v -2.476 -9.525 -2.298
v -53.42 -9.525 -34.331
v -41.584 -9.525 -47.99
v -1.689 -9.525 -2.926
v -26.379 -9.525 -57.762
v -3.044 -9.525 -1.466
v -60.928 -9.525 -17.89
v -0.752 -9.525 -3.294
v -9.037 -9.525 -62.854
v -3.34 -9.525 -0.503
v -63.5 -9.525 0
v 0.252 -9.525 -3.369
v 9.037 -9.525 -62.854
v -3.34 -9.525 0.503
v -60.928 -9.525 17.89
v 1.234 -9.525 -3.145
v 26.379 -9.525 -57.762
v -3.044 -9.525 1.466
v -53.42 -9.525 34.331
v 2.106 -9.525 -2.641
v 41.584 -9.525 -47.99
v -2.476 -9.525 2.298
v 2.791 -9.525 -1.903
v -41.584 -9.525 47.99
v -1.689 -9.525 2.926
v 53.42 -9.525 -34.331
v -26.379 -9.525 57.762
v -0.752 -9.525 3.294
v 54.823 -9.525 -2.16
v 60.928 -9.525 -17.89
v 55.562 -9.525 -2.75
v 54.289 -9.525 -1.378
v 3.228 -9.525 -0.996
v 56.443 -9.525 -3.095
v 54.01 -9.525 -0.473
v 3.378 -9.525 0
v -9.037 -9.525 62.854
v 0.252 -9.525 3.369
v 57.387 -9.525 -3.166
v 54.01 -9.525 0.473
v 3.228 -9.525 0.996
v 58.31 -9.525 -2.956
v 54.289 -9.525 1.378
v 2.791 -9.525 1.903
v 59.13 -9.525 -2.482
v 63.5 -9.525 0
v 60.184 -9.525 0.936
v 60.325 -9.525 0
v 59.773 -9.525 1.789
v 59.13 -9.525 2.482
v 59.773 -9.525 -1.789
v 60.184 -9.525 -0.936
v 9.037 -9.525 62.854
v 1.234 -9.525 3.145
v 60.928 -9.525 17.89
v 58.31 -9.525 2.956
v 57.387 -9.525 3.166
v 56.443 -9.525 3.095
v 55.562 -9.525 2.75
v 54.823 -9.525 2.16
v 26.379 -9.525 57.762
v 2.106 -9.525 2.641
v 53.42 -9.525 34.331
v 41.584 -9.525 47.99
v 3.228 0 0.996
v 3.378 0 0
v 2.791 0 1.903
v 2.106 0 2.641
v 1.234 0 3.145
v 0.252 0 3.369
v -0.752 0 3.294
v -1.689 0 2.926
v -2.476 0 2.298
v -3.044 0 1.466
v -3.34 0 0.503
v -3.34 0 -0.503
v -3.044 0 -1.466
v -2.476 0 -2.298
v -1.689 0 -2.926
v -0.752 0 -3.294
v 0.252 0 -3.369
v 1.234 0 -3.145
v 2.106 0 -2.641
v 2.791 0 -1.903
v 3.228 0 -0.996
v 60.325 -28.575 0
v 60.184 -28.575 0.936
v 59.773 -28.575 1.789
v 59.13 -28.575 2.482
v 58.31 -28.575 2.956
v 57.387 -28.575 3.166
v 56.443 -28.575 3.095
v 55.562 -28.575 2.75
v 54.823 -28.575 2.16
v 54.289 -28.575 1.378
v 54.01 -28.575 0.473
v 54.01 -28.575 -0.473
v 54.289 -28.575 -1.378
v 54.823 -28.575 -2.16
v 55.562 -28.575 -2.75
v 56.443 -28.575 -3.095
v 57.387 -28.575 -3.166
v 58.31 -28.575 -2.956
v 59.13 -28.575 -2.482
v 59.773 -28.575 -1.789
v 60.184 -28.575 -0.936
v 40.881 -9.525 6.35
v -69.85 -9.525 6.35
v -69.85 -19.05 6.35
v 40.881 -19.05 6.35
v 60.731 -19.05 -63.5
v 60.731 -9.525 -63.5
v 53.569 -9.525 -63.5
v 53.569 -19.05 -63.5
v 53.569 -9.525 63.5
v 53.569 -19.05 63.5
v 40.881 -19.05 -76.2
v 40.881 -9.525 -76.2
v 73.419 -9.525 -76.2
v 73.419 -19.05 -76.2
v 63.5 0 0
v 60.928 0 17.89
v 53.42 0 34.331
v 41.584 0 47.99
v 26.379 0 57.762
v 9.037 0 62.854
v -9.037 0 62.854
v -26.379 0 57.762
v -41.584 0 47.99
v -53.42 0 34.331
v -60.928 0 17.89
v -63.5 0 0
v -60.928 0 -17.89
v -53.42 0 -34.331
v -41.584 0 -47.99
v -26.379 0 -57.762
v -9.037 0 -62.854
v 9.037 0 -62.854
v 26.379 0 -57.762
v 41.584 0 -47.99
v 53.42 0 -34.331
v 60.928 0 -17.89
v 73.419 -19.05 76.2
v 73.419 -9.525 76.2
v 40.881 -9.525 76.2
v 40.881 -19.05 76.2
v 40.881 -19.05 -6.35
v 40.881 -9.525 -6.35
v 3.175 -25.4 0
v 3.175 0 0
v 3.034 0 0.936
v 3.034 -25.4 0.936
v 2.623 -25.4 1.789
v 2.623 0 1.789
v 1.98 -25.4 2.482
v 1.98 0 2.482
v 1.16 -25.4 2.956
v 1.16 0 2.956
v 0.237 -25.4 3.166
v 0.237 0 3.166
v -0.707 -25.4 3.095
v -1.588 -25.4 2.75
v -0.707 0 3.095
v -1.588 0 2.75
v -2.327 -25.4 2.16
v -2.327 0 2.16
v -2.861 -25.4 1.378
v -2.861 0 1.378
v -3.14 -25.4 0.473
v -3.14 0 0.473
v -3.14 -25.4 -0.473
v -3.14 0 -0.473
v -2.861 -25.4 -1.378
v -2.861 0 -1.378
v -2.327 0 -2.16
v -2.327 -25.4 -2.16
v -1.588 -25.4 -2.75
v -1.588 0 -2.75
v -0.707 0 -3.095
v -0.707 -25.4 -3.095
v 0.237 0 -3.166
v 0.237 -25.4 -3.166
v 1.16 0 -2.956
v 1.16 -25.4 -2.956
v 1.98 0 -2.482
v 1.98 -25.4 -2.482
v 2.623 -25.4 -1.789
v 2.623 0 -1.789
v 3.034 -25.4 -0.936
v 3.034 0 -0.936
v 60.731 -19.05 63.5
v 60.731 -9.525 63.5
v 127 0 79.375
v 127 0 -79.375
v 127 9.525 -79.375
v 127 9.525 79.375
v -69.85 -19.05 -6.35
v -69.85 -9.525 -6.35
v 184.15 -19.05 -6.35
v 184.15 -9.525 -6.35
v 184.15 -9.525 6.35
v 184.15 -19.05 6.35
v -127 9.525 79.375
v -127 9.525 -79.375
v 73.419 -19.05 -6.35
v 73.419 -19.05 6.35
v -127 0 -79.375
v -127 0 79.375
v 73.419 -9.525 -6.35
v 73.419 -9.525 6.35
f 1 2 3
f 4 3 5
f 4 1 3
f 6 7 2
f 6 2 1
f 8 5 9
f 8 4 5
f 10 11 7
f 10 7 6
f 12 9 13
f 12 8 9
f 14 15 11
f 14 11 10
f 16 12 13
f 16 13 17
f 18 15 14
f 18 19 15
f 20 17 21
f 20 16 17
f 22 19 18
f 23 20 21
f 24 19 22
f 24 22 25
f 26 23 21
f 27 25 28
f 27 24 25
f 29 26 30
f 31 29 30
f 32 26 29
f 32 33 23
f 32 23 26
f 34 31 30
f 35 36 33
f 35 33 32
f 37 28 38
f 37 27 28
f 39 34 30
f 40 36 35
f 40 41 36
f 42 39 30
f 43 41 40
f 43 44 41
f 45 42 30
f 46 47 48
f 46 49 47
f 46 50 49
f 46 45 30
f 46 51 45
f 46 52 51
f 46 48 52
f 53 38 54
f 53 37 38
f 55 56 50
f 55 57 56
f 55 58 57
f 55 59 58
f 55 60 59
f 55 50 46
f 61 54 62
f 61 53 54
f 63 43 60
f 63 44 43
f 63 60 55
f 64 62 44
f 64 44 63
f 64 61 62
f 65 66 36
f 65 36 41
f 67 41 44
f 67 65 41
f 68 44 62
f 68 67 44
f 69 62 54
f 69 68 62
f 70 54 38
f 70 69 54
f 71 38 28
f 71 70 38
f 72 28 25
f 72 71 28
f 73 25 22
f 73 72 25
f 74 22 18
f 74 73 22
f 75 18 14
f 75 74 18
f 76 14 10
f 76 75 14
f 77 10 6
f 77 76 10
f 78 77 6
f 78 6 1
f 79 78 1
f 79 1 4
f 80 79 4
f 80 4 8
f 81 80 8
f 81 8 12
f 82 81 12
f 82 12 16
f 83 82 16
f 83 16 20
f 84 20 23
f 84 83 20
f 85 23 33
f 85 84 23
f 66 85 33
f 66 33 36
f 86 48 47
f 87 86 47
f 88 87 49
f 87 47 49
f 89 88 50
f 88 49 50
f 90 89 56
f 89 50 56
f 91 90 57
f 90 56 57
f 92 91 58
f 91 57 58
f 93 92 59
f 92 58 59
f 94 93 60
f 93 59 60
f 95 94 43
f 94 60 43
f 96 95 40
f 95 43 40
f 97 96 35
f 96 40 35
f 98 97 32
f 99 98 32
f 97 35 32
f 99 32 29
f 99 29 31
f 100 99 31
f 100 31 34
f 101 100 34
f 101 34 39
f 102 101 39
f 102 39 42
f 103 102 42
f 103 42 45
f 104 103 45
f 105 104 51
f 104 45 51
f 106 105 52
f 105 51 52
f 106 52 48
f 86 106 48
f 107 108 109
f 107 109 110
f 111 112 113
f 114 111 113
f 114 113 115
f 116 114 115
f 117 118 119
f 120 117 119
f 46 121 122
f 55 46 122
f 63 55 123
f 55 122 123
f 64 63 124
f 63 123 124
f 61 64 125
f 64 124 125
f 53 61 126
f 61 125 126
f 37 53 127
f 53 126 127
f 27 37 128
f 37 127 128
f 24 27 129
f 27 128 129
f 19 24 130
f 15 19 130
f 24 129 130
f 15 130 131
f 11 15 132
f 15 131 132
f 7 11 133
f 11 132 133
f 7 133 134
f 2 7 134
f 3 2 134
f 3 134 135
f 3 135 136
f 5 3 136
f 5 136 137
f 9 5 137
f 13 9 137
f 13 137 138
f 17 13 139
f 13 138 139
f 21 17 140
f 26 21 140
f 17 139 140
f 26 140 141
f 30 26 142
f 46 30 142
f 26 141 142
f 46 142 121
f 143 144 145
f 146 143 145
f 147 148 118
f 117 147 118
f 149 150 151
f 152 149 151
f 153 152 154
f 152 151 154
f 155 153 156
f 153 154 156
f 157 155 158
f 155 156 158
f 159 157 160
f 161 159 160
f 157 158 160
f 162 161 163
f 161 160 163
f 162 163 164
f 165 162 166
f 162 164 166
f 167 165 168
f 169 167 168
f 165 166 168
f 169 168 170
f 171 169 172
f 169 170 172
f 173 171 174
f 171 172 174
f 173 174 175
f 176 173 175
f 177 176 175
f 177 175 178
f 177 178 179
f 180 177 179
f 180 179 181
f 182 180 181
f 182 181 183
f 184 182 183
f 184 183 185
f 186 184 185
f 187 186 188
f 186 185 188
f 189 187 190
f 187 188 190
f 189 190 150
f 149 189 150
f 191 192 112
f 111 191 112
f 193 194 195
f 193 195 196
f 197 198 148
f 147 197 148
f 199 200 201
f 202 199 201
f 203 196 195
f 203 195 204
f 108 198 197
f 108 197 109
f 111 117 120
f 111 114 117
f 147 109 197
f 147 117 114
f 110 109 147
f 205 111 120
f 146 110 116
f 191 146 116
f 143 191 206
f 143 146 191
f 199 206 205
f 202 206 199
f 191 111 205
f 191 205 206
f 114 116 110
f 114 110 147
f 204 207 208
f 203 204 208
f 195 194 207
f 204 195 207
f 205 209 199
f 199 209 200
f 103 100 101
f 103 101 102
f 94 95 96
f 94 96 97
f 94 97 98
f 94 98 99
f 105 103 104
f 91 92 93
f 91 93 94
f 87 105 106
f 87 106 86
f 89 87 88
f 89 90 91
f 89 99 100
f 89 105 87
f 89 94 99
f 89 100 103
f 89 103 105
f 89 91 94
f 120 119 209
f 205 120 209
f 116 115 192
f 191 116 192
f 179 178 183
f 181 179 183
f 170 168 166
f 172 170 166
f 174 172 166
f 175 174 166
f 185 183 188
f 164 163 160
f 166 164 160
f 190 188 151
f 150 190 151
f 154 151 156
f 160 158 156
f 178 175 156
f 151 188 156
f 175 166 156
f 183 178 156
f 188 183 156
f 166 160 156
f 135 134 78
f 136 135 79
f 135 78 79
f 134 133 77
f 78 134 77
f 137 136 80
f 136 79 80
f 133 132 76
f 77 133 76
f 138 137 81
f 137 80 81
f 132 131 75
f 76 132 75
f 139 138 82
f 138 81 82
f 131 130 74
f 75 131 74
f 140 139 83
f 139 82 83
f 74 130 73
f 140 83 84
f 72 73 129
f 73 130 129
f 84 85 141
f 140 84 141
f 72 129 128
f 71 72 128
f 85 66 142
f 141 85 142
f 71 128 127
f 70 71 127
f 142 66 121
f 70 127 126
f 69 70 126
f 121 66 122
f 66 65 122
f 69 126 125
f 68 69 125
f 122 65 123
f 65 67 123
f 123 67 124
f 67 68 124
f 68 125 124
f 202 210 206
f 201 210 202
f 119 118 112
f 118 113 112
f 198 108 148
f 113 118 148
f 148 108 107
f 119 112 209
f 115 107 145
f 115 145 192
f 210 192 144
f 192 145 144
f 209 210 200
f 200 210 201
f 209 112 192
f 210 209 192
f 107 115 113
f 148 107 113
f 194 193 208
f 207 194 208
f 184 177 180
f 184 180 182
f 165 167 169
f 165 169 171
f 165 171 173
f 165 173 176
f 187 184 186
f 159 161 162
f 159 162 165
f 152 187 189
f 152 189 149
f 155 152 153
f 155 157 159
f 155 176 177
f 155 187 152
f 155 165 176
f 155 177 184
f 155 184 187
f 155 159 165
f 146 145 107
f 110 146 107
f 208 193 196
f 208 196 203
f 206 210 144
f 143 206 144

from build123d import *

# Parameters (mm, degrees)
F1_R     = 63.5
F1_R_2   = 3.3782
F2_DEPTH = 9.525
F3_R     = 3.175
F4_DEPTH = 19.05
F3_W     = 12.6873
F3_H     = 12.7
F3_W_2   = 110.7313
F5_DEPTH = 9.525
F6_W     = 254
F6_H     = 158.75
F6_R     = 63.5
F6_R_2   = 3.3782
F7_DEPTH = 9.525
F8_R     = 3.175
F9_DEPTH = 25.4


with BuildPart() as f2:
    # F1 (on Front) → F2 (new body)
    with BuildSketch(Plane.XZ):
        Circle(F1_R)
        Circle(F1_R_2, mode=Mode.SUBTRACT)
    extrude(amount=F2_DEPTH)

    # F3 (on face) → F4 (join)
    with BuildSketch(Plane.XZ.offset(9.525)):
        with Locations((57.15, 0)):
            Circle(F3_R)
    extrude(amount=F4_DEPTH)


with BuildPart() as f5:
    # F3 (on face) → F5 (new body)
    with BuildSketch(Plane.XZ.offset(9.525)):
        Polygon((53.5686, 6.35), (53.5686, 63.5), (60.7314, 63.5), (60.7314, 6.35), (73.4187, 6.35), (73.4187, 76.2), (40.8813, 76.2), (40.8813, 6.35), align=None)
        with Locations((47.22495, 0)):
            Rectangle(F3_W, F3_H)
        with Locations((67.07505, 0)):
            Rectangle(F3_W, F3_H)
        Polygon((53.5686, -63.5), (53.5686, -6.35), (40.8813, -6.35), (40.8813, -76.2), (73.4187, -76.2), (73.4187, -6.35), (60.7314, -6.35), (60.7314, -63.5), align=None)
        with Locations((-14.48435, 0)):
            Rectangle(F3_W_2, F3_H)
        with Locations((128.78435, 0)):
            Rectangle(F3_W_2, F3_H)
    extrude(amount=F5_DEPTH)


with BuildPart() as f7:
    # F6 (on face) → F7 (new body)
    with BuildSketch(Plane(origin=(0, 0, 0), x_dir=(-1, 0, 0), z_dir=(0, 1, 0))):
        Rectangle(F6_W, F6_H)
        Circle(F6_R, mode=Mode.SUBTRACT)
        Circle(F6_R)
        Circle(F6_R_2, mode=Mode.SUBTRACT)
        Circle(F6_R_2)
    extrude(amount=F7_DEPTH)


with BuildPart() as f9:
    # F8 (on face) → F9 (new body)
    with BuildSketch(Plane.XZ):
        Circle(F8_R)
    extrude(amount=F9_DEPTH)


solid = Compound([f2.part, f5.part, f7.part, f9.part])
